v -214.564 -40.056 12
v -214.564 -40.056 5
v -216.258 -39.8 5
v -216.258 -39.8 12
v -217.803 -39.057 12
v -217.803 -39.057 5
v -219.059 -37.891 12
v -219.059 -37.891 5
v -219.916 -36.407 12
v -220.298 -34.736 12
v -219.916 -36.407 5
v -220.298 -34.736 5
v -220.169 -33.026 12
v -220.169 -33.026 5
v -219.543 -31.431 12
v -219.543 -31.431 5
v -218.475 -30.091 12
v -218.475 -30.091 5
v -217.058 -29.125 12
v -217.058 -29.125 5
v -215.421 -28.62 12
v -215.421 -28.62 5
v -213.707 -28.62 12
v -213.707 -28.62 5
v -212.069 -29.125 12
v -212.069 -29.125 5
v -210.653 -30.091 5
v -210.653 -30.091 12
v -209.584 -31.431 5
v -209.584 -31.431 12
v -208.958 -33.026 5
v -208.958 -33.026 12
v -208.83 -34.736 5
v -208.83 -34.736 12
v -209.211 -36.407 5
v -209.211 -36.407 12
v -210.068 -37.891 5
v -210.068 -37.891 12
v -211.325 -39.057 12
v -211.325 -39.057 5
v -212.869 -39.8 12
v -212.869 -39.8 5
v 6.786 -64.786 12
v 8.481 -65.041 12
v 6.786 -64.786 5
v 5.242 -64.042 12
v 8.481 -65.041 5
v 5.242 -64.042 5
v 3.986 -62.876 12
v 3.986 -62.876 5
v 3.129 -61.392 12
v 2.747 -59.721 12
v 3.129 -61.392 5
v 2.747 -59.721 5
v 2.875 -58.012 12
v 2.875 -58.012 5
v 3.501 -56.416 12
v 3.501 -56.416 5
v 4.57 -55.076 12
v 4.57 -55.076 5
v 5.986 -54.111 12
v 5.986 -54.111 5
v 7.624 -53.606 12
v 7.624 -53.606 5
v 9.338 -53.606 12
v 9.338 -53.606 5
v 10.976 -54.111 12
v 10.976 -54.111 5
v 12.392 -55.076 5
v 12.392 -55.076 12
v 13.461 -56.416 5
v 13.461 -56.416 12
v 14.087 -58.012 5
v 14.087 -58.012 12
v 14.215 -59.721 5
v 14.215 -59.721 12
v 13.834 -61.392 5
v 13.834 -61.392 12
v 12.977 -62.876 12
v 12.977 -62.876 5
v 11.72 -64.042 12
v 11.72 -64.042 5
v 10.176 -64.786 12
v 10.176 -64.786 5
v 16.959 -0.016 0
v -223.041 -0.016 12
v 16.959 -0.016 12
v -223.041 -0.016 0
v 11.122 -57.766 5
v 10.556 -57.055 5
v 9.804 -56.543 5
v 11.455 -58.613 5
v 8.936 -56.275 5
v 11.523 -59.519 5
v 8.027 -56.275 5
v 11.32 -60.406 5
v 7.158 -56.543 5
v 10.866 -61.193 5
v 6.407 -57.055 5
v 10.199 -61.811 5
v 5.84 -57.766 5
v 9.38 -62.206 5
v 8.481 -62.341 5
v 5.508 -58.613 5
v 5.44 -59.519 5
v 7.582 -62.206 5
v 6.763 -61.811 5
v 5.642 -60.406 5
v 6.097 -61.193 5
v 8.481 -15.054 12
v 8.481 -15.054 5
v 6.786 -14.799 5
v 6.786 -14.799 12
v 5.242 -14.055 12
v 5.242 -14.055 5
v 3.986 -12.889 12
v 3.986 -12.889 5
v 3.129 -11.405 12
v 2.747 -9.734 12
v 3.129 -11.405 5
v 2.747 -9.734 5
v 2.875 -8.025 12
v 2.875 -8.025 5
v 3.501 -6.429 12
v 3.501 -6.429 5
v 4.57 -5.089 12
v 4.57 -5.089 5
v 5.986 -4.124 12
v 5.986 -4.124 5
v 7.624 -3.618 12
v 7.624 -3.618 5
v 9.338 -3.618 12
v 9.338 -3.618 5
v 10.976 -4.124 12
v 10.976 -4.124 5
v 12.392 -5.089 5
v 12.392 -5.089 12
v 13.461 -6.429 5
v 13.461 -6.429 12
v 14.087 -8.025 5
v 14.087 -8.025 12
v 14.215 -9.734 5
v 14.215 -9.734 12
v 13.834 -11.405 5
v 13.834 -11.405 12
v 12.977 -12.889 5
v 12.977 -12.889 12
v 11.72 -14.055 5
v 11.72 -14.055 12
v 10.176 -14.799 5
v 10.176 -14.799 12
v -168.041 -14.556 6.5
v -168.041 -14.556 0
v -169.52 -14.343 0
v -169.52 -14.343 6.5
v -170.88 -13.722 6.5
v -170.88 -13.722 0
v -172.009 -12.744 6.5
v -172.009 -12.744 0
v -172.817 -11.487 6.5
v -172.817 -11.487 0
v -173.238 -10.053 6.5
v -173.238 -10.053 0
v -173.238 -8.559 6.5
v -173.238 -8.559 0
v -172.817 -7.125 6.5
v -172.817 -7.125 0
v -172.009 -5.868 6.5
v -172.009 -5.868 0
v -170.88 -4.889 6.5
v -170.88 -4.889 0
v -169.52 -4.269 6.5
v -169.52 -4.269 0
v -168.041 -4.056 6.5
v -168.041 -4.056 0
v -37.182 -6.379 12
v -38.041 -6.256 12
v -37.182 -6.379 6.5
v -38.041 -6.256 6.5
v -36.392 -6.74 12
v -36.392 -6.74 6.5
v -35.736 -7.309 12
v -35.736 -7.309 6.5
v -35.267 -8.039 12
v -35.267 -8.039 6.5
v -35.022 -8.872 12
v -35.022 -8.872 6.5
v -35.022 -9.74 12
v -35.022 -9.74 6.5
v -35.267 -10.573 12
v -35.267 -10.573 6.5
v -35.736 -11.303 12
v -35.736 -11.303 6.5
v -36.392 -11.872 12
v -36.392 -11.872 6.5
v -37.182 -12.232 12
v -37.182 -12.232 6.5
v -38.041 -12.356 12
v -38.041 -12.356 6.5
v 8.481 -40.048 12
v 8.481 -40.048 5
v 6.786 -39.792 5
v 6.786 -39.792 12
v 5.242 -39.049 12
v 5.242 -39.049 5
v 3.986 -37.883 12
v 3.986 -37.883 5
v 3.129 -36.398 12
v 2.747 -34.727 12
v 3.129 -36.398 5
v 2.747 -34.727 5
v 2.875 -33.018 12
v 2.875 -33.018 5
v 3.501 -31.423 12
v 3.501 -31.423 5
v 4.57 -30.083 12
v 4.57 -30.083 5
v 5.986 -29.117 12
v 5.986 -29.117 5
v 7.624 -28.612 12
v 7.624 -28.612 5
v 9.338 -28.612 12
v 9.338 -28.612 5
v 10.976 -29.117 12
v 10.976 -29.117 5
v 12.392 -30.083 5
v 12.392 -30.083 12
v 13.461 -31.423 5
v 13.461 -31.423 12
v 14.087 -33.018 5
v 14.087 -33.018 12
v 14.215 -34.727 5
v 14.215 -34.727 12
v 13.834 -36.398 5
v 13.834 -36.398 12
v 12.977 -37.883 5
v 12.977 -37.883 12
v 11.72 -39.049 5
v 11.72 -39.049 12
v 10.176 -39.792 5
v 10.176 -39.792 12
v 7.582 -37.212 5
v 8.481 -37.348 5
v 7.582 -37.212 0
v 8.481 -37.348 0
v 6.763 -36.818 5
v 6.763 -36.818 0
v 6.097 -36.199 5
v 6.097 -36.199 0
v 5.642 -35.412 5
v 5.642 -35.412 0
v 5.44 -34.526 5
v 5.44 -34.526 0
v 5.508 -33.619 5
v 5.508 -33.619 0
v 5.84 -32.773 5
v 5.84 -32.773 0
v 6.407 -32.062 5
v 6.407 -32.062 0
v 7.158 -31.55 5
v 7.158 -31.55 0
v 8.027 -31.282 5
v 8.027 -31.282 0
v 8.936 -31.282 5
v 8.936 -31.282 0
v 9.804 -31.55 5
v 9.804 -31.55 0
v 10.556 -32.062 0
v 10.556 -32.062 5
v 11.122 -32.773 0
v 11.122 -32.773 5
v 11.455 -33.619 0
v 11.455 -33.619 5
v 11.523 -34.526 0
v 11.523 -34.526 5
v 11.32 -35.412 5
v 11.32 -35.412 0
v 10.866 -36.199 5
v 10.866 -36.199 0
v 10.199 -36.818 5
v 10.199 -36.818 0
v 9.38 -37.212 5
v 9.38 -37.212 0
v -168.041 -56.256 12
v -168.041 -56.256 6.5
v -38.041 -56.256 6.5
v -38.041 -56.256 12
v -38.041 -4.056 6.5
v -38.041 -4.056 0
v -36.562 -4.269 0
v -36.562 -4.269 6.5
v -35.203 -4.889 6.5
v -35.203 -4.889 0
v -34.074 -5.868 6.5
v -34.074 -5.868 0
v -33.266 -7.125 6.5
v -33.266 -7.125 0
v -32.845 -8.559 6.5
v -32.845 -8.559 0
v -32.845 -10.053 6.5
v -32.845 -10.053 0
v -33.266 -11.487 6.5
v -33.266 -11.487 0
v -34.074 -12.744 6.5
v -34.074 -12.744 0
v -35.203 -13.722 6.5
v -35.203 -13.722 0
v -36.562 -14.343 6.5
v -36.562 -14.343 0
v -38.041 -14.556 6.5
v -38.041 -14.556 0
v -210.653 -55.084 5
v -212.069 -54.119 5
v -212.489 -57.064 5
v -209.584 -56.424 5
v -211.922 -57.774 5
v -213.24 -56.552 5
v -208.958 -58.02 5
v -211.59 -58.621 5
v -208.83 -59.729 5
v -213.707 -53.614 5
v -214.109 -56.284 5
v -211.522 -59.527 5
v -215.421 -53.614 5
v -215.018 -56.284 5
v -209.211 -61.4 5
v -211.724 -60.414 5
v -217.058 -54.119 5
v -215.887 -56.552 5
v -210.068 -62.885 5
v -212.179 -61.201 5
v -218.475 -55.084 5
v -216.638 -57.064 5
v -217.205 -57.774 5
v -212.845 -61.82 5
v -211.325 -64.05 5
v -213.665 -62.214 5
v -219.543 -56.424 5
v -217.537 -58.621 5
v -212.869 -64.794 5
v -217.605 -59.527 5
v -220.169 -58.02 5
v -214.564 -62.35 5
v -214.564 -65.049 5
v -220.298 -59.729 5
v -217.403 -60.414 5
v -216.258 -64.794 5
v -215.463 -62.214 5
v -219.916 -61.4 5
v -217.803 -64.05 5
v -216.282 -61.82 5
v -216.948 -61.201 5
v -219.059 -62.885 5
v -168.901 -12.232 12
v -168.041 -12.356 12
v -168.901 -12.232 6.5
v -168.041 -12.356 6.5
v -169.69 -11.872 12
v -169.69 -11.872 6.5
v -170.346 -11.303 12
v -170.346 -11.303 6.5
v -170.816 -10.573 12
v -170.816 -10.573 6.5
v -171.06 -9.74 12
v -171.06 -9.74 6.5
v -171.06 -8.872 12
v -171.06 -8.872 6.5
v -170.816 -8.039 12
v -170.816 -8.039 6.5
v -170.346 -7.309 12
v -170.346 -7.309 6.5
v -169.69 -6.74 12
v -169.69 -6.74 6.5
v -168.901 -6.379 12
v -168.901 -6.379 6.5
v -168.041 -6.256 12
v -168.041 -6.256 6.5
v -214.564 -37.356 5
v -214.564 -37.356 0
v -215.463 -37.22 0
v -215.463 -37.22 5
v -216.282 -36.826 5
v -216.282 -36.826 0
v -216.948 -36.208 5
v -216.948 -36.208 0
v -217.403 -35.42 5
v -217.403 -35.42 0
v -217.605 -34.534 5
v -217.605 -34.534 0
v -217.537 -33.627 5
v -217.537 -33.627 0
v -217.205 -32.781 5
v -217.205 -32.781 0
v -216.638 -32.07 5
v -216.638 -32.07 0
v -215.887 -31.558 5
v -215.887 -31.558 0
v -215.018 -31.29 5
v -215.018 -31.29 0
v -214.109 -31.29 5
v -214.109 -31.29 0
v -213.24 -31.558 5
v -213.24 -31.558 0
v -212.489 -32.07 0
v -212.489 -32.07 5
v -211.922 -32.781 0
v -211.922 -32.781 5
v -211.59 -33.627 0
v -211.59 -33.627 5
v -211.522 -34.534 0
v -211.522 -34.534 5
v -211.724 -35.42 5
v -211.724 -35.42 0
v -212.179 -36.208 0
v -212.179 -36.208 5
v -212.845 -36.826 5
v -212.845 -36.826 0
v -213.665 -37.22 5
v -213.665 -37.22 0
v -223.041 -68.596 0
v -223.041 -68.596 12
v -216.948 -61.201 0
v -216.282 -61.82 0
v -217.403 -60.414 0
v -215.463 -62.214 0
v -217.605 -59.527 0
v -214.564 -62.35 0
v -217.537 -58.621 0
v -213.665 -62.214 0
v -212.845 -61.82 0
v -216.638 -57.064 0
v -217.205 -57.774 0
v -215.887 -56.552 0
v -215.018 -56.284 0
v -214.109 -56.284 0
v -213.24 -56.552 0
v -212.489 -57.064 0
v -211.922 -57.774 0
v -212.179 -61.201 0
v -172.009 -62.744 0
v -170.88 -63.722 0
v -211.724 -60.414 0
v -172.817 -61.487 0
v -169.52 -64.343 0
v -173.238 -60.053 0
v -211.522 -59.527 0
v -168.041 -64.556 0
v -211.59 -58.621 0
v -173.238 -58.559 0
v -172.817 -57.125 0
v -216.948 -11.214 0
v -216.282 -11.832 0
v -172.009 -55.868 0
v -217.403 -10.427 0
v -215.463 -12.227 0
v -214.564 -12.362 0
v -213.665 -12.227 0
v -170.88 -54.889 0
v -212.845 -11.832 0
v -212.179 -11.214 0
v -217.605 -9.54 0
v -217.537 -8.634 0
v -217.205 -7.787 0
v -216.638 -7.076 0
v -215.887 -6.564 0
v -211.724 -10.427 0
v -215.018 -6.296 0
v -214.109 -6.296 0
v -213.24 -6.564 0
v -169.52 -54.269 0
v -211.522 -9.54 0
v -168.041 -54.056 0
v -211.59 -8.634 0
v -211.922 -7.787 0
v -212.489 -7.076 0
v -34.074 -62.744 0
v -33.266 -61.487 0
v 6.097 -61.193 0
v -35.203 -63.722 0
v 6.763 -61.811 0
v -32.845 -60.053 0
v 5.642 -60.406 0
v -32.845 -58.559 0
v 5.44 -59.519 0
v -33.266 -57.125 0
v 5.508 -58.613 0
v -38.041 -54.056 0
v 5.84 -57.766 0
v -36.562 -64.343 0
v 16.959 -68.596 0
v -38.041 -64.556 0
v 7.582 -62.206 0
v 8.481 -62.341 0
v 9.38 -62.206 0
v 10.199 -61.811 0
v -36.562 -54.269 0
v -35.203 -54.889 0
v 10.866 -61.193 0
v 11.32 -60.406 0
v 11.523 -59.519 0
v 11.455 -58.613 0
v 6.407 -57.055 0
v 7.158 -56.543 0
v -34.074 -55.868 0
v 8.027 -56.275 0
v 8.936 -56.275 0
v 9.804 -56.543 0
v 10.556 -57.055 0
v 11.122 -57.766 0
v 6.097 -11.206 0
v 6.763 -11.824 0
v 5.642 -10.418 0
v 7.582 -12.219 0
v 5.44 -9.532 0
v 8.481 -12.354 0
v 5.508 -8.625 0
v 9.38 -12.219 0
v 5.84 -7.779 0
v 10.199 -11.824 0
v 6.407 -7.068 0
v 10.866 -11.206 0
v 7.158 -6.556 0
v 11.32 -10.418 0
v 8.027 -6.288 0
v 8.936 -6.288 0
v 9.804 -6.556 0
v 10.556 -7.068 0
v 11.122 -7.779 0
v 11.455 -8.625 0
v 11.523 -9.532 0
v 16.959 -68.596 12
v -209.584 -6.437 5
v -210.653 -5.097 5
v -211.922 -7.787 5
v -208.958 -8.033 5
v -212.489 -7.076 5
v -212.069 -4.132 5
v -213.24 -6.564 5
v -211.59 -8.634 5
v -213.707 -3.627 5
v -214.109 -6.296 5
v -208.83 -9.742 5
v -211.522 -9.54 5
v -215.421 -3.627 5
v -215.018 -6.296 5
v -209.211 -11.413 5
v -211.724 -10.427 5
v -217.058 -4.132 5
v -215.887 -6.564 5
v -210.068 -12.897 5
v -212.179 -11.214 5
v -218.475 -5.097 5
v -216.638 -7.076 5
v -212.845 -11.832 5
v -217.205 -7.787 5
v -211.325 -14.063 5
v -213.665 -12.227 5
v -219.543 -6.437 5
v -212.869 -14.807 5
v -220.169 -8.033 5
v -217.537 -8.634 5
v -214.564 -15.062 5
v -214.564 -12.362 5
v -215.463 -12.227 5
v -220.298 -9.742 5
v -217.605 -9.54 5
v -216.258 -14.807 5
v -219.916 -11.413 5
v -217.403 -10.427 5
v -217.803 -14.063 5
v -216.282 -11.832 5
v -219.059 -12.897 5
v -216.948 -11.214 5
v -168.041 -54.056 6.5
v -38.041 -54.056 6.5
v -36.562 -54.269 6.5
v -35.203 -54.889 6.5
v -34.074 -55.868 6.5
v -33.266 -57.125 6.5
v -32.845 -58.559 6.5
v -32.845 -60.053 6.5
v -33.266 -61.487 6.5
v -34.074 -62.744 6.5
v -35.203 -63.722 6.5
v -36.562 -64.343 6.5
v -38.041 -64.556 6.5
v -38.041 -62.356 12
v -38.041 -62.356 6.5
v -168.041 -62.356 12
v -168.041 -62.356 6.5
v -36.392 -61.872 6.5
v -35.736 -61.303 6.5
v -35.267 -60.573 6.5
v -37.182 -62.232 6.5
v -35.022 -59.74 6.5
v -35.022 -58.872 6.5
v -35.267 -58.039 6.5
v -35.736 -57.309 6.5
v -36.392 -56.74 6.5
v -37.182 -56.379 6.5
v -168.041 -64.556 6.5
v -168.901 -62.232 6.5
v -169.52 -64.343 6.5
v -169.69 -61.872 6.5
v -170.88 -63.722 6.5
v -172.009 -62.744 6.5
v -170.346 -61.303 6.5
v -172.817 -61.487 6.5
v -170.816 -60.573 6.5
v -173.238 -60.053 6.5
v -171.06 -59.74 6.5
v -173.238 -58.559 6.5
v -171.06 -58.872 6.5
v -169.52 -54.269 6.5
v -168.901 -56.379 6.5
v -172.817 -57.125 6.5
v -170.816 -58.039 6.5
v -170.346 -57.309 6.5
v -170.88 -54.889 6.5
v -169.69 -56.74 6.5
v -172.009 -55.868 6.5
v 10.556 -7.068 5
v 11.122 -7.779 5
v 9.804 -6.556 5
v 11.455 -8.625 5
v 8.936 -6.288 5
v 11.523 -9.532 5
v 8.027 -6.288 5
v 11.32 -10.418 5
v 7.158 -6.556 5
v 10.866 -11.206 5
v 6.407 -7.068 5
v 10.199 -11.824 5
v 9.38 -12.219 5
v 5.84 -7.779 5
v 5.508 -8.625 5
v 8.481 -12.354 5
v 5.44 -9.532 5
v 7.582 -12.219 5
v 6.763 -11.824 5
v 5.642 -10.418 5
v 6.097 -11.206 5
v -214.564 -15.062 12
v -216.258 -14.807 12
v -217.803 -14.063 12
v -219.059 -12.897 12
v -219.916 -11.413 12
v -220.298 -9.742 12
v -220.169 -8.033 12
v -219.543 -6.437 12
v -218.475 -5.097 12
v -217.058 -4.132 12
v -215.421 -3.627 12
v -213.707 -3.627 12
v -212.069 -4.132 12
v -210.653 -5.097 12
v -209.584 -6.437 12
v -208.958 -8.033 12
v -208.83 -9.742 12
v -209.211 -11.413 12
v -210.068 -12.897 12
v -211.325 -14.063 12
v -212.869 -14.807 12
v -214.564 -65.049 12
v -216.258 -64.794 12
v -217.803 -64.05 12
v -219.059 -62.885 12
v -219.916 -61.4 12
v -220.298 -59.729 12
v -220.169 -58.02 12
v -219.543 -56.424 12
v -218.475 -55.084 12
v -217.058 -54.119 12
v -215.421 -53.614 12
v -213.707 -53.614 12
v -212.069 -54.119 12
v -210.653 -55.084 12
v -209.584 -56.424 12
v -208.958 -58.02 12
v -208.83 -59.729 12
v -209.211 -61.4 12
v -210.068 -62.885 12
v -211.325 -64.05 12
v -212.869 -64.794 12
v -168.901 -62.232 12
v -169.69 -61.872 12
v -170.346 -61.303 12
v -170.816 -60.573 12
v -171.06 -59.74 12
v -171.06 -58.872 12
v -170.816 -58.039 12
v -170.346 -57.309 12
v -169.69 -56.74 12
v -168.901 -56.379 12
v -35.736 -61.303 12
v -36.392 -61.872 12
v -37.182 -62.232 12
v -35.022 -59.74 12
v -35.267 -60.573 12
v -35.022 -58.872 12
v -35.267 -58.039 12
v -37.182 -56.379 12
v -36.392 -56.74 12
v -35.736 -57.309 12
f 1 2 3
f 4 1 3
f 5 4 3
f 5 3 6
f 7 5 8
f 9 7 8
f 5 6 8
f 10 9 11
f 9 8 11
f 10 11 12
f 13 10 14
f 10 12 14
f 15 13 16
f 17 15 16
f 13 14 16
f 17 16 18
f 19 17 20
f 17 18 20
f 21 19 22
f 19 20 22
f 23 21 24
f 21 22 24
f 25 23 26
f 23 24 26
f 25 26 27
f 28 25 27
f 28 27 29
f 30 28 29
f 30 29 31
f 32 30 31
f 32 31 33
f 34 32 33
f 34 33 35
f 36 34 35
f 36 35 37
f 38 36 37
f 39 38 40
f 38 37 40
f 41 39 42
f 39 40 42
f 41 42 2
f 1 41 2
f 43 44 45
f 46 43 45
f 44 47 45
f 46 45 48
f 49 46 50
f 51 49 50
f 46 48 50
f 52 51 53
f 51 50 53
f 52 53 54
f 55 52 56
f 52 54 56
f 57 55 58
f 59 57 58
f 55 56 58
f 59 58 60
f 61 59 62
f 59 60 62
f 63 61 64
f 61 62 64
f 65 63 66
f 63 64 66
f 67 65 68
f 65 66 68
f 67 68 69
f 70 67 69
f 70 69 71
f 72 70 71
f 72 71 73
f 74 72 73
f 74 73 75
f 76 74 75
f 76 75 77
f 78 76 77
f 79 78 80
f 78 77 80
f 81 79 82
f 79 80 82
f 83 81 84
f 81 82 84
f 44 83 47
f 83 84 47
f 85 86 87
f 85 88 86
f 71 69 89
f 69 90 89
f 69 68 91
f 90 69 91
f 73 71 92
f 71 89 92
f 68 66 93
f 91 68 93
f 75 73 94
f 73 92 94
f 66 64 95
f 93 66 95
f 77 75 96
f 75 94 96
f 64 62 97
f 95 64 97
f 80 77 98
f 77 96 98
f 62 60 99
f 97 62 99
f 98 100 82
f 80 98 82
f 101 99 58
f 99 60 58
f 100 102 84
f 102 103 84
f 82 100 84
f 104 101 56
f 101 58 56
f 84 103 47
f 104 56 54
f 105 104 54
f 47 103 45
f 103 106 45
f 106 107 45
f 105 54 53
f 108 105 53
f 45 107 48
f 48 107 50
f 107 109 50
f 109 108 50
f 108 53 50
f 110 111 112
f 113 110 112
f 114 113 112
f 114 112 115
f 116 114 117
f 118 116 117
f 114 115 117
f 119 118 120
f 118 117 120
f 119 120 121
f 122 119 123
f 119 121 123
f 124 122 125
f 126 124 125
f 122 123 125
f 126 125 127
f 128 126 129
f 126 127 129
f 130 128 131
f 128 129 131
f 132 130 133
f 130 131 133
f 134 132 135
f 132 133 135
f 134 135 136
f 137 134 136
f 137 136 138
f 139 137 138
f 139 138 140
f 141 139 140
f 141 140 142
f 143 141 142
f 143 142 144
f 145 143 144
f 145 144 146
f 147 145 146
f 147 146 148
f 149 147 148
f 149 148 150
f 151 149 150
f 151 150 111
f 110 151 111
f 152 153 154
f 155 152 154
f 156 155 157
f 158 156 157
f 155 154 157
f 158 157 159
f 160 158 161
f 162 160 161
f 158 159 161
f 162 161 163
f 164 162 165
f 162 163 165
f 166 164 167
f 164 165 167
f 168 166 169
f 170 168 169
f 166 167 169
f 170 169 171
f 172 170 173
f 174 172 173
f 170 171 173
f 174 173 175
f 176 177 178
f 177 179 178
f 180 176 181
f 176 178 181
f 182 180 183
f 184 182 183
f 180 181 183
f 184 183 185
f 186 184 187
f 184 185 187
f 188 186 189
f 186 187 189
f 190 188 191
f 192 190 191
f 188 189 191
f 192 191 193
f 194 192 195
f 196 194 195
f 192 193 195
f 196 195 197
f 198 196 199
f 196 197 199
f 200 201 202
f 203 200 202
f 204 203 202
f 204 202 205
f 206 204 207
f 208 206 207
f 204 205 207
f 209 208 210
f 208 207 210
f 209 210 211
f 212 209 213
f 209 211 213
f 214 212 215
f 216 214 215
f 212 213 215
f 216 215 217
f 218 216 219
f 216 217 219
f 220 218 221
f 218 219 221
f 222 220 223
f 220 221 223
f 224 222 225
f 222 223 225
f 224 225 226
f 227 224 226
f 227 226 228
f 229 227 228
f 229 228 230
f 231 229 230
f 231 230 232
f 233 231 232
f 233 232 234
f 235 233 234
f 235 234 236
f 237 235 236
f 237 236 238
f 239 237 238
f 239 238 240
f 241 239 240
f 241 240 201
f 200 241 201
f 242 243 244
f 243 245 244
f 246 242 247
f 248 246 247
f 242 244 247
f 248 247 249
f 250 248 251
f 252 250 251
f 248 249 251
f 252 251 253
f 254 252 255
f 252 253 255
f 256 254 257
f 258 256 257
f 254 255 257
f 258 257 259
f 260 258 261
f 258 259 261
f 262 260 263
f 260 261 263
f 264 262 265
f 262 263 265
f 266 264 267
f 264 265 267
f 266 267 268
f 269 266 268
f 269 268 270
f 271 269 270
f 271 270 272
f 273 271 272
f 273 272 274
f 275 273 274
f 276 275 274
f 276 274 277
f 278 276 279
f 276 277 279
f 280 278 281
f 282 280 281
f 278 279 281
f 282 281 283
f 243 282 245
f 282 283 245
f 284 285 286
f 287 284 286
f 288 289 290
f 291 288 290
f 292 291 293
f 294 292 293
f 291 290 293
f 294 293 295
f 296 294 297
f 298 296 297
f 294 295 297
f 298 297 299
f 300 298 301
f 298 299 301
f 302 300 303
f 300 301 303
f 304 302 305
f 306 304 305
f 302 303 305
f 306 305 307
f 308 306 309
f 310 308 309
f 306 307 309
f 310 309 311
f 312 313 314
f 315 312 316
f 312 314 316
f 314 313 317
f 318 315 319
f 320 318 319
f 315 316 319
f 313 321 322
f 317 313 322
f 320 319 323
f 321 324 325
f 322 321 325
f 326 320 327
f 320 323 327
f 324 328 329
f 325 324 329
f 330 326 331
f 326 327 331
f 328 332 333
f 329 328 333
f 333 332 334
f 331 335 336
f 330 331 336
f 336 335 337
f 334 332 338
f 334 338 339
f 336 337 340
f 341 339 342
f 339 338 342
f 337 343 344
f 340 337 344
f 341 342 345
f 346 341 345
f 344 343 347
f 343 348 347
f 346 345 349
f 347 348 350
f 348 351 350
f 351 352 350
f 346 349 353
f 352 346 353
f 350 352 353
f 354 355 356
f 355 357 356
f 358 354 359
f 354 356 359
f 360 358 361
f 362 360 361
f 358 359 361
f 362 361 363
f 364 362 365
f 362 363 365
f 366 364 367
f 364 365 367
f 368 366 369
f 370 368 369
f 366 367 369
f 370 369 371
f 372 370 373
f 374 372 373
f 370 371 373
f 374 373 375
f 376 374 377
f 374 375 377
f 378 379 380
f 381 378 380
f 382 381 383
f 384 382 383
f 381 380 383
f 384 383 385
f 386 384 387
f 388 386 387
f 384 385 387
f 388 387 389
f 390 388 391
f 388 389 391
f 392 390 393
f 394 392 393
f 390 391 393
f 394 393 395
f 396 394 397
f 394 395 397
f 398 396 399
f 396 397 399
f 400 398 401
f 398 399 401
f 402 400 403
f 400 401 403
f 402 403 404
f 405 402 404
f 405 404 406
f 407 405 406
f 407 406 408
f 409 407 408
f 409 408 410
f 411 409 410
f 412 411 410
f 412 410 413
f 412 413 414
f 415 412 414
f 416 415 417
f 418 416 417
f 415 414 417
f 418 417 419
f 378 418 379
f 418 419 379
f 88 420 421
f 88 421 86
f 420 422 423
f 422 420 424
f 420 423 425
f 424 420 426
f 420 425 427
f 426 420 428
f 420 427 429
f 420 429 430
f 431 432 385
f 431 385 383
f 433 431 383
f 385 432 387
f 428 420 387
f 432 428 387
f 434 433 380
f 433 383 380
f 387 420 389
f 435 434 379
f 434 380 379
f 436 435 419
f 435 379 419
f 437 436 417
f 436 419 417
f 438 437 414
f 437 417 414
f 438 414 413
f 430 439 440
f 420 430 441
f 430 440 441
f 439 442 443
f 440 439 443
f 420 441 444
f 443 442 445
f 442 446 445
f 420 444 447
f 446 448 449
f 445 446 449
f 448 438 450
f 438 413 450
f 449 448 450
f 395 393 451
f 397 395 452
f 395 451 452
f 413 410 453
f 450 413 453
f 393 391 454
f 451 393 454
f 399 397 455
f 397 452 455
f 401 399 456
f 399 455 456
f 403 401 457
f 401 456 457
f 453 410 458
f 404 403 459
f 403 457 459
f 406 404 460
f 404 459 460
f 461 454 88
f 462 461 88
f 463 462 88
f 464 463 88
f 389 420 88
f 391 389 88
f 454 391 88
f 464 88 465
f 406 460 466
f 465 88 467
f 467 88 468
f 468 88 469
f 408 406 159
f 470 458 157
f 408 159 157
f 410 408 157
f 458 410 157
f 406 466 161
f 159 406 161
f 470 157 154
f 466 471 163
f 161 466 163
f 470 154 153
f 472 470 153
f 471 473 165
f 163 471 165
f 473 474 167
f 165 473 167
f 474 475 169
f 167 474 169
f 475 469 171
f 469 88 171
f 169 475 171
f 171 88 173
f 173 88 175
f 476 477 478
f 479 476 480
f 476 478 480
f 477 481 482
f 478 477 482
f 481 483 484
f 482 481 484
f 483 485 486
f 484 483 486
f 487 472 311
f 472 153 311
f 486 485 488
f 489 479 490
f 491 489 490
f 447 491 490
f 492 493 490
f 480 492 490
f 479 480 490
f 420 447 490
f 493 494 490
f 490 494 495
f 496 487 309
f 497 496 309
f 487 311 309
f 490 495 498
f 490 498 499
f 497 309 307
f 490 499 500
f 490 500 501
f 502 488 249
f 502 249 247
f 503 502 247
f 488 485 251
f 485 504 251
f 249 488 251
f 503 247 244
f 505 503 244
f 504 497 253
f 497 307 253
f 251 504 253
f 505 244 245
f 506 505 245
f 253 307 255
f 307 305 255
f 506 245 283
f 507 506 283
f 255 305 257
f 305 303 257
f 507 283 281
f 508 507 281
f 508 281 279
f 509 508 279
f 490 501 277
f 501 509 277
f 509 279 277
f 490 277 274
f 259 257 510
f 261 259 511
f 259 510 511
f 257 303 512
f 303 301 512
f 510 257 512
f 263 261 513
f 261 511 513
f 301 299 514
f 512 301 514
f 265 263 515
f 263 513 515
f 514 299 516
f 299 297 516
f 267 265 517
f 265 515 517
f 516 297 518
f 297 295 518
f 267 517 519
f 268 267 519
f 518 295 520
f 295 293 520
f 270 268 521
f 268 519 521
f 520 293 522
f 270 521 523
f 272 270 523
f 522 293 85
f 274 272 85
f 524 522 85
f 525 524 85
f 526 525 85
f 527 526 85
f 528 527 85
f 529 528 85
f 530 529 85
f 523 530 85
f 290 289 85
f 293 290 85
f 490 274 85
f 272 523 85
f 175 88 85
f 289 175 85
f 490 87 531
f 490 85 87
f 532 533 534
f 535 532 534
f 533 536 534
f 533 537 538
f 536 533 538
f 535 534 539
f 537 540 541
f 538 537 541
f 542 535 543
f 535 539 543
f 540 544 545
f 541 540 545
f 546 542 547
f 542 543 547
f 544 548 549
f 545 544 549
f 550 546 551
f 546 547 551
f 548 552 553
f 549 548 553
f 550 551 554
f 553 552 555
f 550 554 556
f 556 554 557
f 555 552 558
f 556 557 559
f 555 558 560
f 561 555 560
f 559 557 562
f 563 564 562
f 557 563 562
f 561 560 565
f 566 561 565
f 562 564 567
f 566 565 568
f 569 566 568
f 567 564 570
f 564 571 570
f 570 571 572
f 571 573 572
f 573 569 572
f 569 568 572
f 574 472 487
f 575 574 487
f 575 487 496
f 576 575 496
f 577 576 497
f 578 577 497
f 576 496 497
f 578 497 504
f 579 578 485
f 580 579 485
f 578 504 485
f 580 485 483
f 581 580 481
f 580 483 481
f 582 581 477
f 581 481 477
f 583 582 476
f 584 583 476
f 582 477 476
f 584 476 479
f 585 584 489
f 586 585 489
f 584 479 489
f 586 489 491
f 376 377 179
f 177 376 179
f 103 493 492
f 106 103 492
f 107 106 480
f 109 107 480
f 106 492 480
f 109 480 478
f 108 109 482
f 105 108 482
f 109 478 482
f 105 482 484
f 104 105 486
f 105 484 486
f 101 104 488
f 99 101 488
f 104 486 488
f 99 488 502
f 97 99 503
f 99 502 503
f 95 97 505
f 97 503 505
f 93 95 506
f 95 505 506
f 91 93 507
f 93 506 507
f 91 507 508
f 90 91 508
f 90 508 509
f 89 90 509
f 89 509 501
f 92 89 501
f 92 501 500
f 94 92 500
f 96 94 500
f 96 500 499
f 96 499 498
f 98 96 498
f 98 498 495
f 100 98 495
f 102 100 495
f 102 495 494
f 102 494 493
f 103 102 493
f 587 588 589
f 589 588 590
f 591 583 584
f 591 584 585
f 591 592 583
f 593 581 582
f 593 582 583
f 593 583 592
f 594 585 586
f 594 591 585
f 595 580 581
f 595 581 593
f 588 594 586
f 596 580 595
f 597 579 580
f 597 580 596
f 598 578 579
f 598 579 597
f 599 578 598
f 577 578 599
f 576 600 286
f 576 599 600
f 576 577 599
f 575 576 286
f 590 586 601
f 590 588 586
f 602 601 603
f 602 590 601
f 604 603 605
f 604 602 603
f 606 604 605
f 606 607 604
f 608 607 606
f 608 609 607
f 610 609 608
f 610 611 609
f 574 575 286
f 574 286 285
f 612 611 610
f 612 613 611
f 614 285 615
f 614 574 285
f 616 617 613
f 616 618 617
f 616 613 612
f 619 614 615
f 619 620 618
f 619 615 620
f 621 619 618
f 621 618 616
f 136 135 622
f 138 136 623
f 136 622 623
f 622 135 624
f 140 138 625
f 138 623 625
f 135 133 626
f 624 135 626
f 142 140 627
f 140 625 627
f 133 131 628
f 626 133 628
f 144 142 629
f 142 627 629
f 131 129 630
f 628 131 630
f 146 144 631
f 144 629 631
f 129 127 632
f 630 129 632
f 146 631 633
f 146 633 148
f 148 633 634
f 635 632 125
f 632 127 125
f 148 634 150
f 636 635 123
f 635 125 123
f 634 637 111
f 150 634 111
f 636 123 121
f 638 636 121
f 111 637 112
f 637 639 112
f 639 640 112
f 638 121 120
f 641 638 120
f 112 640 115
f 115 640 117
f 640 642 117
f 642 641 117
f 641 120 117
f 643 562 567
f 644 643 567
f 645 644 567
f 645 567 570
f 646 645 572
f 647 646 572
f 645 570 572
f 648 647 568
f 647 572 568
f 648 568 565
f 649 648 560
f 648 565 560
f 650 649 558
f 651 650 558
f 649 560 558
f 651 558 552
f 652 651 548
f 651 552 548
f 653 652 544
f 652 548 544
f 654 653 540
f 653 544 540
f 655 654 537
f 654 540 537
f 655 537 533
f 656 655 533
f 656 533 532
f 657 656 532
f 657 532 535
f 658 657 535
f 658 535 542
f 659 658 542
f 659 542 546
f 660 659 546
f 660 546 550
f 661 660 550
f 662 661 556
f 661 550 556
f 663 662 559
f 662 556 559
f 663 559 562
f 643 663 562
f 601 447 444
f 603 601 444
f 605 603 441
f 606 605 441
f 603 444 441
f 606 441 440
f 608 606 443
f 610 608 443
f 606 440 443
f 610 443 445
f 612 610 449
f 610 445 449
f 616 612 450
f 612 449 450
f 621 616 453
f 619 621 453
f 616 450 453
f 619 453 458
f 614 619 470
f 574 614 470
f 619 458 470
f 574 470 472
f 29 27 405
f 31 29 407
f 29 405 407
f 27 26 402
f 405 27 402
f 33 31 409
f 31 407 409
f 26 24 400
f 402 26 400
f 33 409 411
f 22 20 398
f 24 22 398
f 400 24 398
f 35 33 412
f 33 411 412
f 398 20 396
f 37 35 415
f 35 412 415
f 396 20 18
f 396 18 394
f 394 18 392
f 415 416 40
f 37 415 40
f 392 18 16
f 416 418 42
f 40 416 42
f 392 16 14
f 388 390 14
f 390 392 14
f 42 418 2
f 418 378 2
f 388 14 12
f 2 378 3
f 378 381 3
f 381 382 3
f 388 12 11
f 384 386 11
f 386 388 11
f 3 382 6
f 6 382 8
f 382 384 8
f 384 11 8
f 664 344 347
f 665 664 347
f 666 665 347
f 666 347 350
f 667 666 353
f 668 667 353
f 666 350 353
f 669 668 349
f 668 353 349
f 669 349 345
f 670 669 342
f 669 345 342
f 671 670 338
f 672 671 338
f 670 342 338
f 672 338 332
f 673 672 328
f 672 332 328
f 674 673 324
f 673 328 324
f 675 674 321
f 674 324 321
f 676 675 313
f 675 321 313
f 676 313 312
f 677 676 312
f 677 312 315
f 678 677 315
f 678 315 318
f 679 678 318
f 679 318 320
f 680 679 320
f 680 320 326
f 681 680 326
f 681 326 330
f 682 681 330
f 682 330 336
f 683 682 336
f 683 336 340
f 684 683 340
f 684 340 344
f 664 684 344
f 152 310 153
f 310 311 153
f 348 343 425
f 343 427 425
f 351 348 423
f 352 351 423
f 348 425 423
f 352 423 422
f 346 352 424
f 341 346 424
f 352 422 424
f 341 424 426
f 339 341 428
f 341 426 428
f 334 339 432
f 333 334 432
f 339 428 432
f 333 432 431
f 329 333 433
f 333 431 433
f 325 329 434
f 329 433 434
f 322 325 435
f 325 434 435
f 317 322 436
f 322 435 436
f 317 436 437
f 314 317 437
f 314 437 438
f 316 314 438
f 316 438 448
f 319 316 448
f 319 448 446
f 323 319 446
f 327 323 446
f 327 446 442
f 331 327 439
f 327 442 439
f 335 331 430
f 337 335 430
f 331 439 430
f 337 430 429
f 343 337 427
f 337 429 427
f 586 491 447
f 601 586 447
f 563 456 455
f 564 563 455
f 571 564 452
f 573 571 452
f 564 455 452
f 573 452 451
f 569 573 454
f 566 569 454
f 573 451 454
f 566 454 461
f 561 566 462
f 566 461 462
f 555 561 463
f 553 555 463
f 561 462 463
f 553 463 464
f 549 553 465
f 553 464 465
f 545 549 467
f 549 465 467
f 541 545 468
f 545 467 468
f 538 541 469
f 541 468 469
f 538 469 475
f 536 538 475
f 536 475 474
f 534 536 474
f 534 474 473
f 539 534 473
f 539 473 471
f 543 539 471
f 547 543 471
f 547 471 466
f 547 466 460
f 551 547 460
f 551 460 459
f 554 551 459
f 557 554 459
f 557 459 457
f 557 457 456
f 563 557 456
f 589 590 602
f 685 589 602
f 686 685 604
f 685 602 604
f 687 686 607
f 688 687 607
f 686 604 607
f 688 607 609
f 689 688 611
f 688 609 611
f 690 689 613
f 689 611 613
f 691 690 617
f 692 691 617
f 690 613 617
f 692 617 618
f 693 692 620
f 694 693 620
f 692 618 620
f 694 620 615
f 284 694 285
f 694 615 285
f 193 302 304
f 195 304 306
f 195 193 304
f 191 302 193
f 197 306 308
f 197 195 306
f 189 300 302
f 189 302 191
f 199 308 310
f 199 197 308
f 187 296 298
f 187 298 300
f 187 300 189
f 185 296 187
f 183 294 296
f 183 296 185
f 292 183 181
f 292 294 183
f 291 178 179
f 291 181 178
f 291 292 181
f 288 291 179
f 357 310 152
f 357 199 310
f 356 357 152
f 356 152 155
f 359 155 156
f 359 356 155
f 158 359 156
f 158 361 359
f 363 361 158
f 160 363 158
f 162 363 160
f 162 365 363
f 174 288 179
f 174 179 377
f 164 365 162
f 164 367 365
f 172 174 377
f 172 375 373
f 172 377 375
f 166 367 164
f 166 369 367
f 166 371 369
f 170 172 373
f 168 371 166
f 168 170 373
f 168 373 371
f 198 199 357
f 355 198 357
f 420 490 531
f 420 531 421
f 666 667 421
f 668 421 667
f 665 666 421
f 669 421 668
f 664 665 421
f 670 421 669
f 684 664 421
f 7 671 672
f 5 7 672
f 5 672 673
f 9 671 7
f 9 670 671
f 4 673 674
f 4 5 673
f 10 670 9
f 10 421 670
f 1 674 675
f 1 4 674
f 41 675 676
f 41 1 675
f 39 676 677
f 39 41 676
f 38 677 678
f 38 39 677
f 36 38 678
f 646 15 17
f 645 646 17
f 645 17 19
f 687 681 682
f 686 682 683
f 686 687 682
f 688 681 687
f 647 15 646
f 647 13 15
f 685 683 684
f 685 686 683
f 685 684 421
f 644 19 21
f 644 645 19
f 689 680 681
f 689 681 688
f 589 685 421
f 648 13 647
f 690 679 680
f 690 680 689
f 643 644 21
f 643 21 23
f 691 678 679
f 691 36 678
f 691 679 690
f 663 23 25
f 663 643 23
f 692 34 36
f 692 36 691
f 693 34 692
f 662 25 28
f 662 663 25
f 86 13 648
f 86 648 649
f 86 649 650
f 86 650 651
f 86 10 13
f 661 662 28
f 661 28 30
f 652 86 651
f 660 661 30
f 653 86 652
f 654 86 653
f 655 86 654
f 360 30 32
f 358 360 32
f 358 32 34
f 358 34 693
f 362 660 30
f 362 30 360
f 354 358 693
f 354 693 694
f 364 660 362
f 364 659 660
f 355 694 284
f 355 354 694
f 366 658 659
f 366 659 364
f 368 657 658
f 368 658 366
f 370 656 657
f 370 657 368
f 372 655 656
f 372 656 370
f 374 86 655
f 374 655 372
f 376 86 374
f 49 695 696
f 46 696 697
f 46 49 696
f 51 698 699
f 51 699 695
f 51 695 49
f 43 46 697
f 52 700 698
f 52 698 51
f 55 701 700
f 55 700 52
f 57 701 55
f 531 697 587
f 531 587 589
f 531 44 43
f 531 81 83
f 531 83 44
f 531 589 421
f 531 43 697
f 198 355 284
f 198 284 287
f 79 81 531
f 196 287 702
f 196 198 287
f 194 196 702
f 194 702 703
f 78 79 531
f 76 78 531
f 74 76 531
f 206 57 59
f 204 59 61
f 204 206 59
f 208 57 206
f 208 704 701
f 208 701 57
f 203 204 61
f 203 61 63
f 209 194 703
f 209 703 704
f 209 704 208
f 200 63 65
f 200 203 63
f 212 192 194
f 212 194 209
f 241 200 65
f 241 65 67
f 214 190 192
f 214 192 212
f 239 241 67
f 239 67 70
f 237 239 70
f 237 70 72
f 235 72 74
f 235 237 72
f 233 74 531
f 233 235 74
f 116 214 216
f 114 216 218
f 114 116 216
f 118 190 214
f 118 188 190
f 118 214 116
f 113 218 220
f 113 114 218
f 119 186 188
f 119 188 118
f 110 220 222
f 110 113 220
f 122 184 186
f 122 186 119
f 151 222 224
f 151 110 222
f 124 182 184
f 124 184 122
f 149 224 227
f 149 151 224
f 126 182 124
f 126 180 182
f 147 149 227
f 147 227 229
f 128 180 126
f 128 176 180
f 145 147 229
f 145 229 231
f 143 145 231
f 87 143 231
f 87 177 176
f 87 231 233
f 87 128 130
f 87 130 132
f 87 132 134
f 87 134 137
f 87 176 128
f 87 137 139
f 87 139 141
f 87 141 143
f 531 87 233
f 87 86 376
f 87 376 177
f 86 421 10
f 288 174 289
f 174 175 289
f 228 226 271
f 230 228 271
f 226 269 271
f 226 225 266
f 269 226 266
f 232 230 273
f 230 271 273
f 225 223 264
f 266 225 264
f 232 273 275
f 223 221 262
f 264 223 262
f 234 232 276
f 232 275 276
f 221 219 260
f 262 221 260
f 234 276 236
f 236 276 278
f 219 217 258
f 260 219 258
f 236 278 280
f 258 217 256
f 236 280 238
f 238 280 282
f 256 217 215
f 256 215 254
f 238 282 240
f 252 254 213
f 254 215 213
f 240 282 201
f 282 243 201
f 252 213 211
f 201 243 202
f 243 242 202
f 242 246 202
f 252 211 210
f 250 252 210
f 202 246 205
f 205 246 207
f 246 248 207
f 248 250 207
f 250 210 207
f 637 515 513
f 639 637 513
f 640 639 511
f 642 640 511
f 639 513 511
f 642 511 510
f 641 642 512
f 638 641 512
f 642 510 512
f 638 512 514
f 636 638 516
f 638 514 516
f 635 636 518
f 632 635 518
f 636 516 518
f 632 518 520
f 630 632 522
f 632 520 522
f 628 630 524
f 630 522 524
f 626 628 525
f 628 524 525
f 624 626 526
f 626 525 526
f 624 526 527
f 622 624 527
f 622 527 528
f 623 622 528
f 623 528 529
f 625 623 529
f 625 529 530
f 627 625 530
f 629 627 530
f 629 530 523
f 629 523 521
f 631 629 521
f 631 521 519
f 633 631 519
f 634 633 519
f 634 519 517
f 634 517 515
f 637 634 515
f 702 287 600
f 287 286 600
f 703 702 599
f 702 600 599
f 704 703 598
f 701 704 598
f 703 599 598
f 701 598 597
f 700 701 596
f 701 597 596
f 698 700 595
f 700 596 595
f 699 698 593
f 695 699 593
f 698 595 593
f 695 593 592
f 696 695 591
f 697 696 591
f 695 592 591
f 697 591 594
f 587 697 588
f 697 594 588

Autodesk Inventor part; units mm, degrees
ref_plane "YZ Plane" through (0, 0, 0) normal (1, 0, 0) x (0, 1, 0)
ref_plane "XZ Plane" through (0, 0, 0) normal (0, 1, 0) x (-1, 0, 0)
ref_plane "XY Plane" through (0, 0, 0) normal (0, 0, 1) x (1, 0, 0)
sketch "Sketch1" plane through (0, 0, 0) normal (0, 0, 1) x (1, 0, 0)
  line L0 (-206.4864, -0.0159) -> (-206.4864, -68.5959) construction
  line L1 (-206.4864, -0.0159) -> (-222.6154, -0.0159) construction
  line L2 (-222.6154, -0.0159) -> (-222.6154, -68.5959) construction
  line L3 (-206.4864, -68.5959) -> (-222.6154, -68.5959) construction
  circle A0 centre (-214.5636, -21.8091) radius 3.3735 construction
  circle A1 centre (-214.5636, -46.8027) radius 3.3735 construction
  circle A2 centre (-214.5636, -9.3123) radius 2.5 construction
  circle A3 centre (-214.5636, -34.3059) radius 2.5 construction
  circle A4 centre (-214.5636, -59.2995) radius 2.5 construction
  line L4 (0.4039, -68.5877) -> (0.4039, -0.0077) construction
  line L5 (0.4039, -68.5877) -> (16.5329, -68.5877) construction
  line L6 (16.5329, -68.5877) -> (16.5329, -0.0077) construction
  line L7 (0.4039, -0.0077) -> (16.5329, -0.0077) construction
  circle A5 centre (8.4811, -46.7945) radius 3.3735 construction
  circle A6 centre (8.4811, -21.8009) radius 3.3735 construction
  circle A7 centre (8.4811, -59.2913) radius 2.5 construction
  circle A8 centre (8.4811, -34.2977) radius 2.5 construction
  circle A9 centre (8.4811, -9.3041) radius 2.5 construction
  line L8 (-223.0413, -0.0159) -> (16.9587, -0.0159)
  line L9 (16.9587, -0.0159) -> (16.9587, -68.5959)
  line L10 (16.9587, -68.5959) -> (-223.0413, -68.5959)
  line L11 (-223.0413, -68.5959) -> (-223.0413, -0.0159)
  line L12 (-103.0413, -534.726) -> (-103.0413, 430.7972) construction
  point P0 (0, 0)
  dimension "d0" = 240
  dimension "d23" = 120
extrude "Extrusion1" add sketch "Sketch1" along normal blind 12
sketch "Sketch3" plane through (0, 0, 0) normal (0, 0, -1) x (-1, 0, 0)
  circle A0 centre (65.542, -46.7868) radius 2.5 construction
  circle A1 centre (65.542, -21.7868) radius 2.5 construction
  circle A2 centre (165.542, -21.7868) radius 2.5 construction
  circle A3 centre (165.542, -46.7868) radius 2.5 construction
  circle A4 centre (140.542, -46.7868) radius 2.5 construction
  circle A5 centre (140.542, -21.7868) radius 2.5 construction
  circle A6 centre (65.542, -46.7868) radius 2.5 construction
  circle A7 centre (65.542, -21.7868) radius 2.5 construction
  circle A8 centre (40.542, -21.7868) radius 2.5 construction
  circle A9 centre (40.542, -46.7868) radius 2.5 construction
  point P0 (0, 0)
sketch "Sketch4" plane through (0, 0, 0) normal (0, 0, -1) x (-1, 0, 0)
  circle A0 centre (65.5413, -59.3059) radius 2.5 construction
  circle A1 centre (40.5413, -59.3059) radius 2.5 construction
  circle A2 centre (140.5413, -9.3059) radius 2.5 construction
  circle A3 centre (115.5413, -9.3059) radius 2.5 construction
  line L0 (40.5413, -59.3059) -> (172.5963, -59.3059) construction
  line L1 (167.5124, -9.3059) -> (3.0086, -9.3059) construction
  line L2 (223.0413, -0.0159) -> (-16.9587, -0.0159) construction
  line L3 (38.0413, -9.3059) -> (168.0413, -9.3059) construction
  line L4 (38.0413, -12.3559) -> (168.0413, -12.3559)
  line L5 (168.0413, -6.2559) -> (38.0413, -6.2559)
  arc A4 (38.0413, -6.2559) -> (38.0413, -12.3559) centre (38.0413, -9.3059) ccw
  arc A5 (168.0413, -12.3559) -> (168.0413, -6.2559) centre (168.0413, -9.3059) ccw
  line L6 (103.0413, 455.7975) -> (103.0413, -509.7257) construction
  line L7 (38.0413, -59.3059) -> (168.0413, -59.3059) construction
  line L8 (38.0413, -62.3559) -> (168.0413, -62.3559)
  line L9 (168.0413, -56.2559) -> (38.0413, -56.2559)
  arc A6 (38.0413, -56.2559) -> (38.0413, -62.3559) centre (38.0413, -59.3059) ccw
  arc A7 (168.0413, -62.3559) -> (168.0413, -56.2559) centre (168.0413, -59.3059) ccw
  point P0 (0, 0)
  point P1 (-16.9587, -0.0159)
  point P2 (103.0413, -9.3059)
  point P3 (103.0413, -59.3059)
  dimension "d10" = 9.29
  dimension "d11" = 6.1
  dimension "d12" = 65
  dimension "d13" = 65
  dimension "d14" = 6.1
  dimension "d15" = 65
  dimension "d16" = 65
extrude "Extrusion2" cut sketch "Sketch4" against normal blind 12
sketch "Sketch5" plane through (0, 0, 0) normal (0, 0, -1) x (-1, 0, 0)
  line L0 (45.6373, -31.0674) -> (77.6413, -31.0674) construction
  arc A0 (168.0413, -12.3559) -> (168.0413, -6.2559) centre (168.0413, -9.3059) ccw construction
  arc A1 (168.0413, -62.3559) -> (168.0413, -56.2559) centre (168.0413, -59.3059) ccw construction
  arc A2 (38.0413, -6.2559) -> (38.0413, -12.3559) centre (38.0413, -9.3059) ccw construction
  arc A3 (38.0413, -56.2559) -> (38.0413, -62.3559) centre (38.0413, -59.3059) ccw construction
  line L1 (38.0413, -9.3059) -> (168.0413, -9.3059) construction
  line L2 (-16.9587, -0.0159) -> (223.0413, -0.0159) projected
  line L3 (38.0413, -14.5559) -> (168.0413, -14.5559)
  line L4 (168.0413, -4.0559) -> (38.0413, -4.0559)
  arc A4 (38.0413, -4.0559) -> (38.0413, -14.5559) centre (38.0413, -9.3059) ccw
  arc A5 (168.0413, -14.5559) -> (168.0413, -4.0559) centre (168.0413, -9.3059) ccw
  line L5 (38.0413, -59.3059) -> (168.0413, -59.3059) construction
  line L6 (38.0413, -64.5559) -> (168.0413, -64.5559)
  line L7 (168.0413, -54.0559) -> (38.0413, -54.0559)
  arc A6 (38.0413, -54.0559) -> (38.0413, -64.5559) centre (38.0413, -59.3059) ccw
  arc A7 (168.0413, -64.5559) -> (168.0413, -54.0559) centre (168.0413, -59.3059) ccw
  point P0 (0, 0)
  point P1 (103.0413, -9.3059)
  point P2 (103.0413, -59.3059)
  dimension "d19" = 10.5
  dimension "d20" = 10.5
extrude "Extrusion3" cut sketch "Sketch5" against normal blind 6.5
sketch "Sketch6" plane through (0, 0, 12) normal (0, 0, 1) x (1, 0, 0)
  line L0 (0.4039, -68.5877) -> (0.4039, -0.0077) construction
  line L1 (0.4039, -68.5877) -> (16.5329, -68.5877) construction
  line L2 (16.5329, -68.5877) -> (16.5329, -0.0077) construction
  line L3 (0.4039, -0.0077) -> (16.5329, -0.0077) construction
  circle A0 centre (8.4811, -46.7945) radius 3.3735 construction
  circle A1 centre (8.4811, -21.8009) radius 3.3735 construction
  circle A2 centre (8.4811, -59.2913) radius 2.5 construction
  circle A3 centre (8.4811, -34.2977) radius 2.5 construction
  circle A4 centre (8.4811, -9.3041) radius 2.5 construction
  line L4 (-206.4864, -0.0159) -> (-206.4864, -68.5959) construction
  line L5 (-206.4864, -0.0159) -> (-222.6154, -0.0159) construction
  line L6 (-222.6154, -0.0159) -> (-222.6154, -68.5959) construction
  line L7 (-206.4864, -68.5959) -> (-222.6154, -68.5959) construction
  circle A5 centre (-214.5636, -21.8091) radius 3.3735 construction
  circle A6 centre (-214.5636, -46.8027) radius 3.3735 construction
  circle A7 centre (-214.5636, -9.3123) radius 2.5 construction
  circle A8 centre (-214.5636, -34.3059) radius 2.5 construction
  circle A9 centre (-214.5636, -59.2995) radius 2.5 construction
  point P0 (0, 0)
hole "Hole2" at (8.4811, -59.2913, 12) at (8.4811, -34.2977, 12) at (8.4811, -9.3041, 12) at (-214.5636, -59.2995, 12) at (-214.5636, -34.3059, 12) at (-214.5636, -9.3123, 12) direction (0, 0, -1) diameter 6.1 depth 20 tip angle 118 counterbore diameter 11.5 counterbore depth 7
properties part number "ASI_mesoSPIM_Bridge"
